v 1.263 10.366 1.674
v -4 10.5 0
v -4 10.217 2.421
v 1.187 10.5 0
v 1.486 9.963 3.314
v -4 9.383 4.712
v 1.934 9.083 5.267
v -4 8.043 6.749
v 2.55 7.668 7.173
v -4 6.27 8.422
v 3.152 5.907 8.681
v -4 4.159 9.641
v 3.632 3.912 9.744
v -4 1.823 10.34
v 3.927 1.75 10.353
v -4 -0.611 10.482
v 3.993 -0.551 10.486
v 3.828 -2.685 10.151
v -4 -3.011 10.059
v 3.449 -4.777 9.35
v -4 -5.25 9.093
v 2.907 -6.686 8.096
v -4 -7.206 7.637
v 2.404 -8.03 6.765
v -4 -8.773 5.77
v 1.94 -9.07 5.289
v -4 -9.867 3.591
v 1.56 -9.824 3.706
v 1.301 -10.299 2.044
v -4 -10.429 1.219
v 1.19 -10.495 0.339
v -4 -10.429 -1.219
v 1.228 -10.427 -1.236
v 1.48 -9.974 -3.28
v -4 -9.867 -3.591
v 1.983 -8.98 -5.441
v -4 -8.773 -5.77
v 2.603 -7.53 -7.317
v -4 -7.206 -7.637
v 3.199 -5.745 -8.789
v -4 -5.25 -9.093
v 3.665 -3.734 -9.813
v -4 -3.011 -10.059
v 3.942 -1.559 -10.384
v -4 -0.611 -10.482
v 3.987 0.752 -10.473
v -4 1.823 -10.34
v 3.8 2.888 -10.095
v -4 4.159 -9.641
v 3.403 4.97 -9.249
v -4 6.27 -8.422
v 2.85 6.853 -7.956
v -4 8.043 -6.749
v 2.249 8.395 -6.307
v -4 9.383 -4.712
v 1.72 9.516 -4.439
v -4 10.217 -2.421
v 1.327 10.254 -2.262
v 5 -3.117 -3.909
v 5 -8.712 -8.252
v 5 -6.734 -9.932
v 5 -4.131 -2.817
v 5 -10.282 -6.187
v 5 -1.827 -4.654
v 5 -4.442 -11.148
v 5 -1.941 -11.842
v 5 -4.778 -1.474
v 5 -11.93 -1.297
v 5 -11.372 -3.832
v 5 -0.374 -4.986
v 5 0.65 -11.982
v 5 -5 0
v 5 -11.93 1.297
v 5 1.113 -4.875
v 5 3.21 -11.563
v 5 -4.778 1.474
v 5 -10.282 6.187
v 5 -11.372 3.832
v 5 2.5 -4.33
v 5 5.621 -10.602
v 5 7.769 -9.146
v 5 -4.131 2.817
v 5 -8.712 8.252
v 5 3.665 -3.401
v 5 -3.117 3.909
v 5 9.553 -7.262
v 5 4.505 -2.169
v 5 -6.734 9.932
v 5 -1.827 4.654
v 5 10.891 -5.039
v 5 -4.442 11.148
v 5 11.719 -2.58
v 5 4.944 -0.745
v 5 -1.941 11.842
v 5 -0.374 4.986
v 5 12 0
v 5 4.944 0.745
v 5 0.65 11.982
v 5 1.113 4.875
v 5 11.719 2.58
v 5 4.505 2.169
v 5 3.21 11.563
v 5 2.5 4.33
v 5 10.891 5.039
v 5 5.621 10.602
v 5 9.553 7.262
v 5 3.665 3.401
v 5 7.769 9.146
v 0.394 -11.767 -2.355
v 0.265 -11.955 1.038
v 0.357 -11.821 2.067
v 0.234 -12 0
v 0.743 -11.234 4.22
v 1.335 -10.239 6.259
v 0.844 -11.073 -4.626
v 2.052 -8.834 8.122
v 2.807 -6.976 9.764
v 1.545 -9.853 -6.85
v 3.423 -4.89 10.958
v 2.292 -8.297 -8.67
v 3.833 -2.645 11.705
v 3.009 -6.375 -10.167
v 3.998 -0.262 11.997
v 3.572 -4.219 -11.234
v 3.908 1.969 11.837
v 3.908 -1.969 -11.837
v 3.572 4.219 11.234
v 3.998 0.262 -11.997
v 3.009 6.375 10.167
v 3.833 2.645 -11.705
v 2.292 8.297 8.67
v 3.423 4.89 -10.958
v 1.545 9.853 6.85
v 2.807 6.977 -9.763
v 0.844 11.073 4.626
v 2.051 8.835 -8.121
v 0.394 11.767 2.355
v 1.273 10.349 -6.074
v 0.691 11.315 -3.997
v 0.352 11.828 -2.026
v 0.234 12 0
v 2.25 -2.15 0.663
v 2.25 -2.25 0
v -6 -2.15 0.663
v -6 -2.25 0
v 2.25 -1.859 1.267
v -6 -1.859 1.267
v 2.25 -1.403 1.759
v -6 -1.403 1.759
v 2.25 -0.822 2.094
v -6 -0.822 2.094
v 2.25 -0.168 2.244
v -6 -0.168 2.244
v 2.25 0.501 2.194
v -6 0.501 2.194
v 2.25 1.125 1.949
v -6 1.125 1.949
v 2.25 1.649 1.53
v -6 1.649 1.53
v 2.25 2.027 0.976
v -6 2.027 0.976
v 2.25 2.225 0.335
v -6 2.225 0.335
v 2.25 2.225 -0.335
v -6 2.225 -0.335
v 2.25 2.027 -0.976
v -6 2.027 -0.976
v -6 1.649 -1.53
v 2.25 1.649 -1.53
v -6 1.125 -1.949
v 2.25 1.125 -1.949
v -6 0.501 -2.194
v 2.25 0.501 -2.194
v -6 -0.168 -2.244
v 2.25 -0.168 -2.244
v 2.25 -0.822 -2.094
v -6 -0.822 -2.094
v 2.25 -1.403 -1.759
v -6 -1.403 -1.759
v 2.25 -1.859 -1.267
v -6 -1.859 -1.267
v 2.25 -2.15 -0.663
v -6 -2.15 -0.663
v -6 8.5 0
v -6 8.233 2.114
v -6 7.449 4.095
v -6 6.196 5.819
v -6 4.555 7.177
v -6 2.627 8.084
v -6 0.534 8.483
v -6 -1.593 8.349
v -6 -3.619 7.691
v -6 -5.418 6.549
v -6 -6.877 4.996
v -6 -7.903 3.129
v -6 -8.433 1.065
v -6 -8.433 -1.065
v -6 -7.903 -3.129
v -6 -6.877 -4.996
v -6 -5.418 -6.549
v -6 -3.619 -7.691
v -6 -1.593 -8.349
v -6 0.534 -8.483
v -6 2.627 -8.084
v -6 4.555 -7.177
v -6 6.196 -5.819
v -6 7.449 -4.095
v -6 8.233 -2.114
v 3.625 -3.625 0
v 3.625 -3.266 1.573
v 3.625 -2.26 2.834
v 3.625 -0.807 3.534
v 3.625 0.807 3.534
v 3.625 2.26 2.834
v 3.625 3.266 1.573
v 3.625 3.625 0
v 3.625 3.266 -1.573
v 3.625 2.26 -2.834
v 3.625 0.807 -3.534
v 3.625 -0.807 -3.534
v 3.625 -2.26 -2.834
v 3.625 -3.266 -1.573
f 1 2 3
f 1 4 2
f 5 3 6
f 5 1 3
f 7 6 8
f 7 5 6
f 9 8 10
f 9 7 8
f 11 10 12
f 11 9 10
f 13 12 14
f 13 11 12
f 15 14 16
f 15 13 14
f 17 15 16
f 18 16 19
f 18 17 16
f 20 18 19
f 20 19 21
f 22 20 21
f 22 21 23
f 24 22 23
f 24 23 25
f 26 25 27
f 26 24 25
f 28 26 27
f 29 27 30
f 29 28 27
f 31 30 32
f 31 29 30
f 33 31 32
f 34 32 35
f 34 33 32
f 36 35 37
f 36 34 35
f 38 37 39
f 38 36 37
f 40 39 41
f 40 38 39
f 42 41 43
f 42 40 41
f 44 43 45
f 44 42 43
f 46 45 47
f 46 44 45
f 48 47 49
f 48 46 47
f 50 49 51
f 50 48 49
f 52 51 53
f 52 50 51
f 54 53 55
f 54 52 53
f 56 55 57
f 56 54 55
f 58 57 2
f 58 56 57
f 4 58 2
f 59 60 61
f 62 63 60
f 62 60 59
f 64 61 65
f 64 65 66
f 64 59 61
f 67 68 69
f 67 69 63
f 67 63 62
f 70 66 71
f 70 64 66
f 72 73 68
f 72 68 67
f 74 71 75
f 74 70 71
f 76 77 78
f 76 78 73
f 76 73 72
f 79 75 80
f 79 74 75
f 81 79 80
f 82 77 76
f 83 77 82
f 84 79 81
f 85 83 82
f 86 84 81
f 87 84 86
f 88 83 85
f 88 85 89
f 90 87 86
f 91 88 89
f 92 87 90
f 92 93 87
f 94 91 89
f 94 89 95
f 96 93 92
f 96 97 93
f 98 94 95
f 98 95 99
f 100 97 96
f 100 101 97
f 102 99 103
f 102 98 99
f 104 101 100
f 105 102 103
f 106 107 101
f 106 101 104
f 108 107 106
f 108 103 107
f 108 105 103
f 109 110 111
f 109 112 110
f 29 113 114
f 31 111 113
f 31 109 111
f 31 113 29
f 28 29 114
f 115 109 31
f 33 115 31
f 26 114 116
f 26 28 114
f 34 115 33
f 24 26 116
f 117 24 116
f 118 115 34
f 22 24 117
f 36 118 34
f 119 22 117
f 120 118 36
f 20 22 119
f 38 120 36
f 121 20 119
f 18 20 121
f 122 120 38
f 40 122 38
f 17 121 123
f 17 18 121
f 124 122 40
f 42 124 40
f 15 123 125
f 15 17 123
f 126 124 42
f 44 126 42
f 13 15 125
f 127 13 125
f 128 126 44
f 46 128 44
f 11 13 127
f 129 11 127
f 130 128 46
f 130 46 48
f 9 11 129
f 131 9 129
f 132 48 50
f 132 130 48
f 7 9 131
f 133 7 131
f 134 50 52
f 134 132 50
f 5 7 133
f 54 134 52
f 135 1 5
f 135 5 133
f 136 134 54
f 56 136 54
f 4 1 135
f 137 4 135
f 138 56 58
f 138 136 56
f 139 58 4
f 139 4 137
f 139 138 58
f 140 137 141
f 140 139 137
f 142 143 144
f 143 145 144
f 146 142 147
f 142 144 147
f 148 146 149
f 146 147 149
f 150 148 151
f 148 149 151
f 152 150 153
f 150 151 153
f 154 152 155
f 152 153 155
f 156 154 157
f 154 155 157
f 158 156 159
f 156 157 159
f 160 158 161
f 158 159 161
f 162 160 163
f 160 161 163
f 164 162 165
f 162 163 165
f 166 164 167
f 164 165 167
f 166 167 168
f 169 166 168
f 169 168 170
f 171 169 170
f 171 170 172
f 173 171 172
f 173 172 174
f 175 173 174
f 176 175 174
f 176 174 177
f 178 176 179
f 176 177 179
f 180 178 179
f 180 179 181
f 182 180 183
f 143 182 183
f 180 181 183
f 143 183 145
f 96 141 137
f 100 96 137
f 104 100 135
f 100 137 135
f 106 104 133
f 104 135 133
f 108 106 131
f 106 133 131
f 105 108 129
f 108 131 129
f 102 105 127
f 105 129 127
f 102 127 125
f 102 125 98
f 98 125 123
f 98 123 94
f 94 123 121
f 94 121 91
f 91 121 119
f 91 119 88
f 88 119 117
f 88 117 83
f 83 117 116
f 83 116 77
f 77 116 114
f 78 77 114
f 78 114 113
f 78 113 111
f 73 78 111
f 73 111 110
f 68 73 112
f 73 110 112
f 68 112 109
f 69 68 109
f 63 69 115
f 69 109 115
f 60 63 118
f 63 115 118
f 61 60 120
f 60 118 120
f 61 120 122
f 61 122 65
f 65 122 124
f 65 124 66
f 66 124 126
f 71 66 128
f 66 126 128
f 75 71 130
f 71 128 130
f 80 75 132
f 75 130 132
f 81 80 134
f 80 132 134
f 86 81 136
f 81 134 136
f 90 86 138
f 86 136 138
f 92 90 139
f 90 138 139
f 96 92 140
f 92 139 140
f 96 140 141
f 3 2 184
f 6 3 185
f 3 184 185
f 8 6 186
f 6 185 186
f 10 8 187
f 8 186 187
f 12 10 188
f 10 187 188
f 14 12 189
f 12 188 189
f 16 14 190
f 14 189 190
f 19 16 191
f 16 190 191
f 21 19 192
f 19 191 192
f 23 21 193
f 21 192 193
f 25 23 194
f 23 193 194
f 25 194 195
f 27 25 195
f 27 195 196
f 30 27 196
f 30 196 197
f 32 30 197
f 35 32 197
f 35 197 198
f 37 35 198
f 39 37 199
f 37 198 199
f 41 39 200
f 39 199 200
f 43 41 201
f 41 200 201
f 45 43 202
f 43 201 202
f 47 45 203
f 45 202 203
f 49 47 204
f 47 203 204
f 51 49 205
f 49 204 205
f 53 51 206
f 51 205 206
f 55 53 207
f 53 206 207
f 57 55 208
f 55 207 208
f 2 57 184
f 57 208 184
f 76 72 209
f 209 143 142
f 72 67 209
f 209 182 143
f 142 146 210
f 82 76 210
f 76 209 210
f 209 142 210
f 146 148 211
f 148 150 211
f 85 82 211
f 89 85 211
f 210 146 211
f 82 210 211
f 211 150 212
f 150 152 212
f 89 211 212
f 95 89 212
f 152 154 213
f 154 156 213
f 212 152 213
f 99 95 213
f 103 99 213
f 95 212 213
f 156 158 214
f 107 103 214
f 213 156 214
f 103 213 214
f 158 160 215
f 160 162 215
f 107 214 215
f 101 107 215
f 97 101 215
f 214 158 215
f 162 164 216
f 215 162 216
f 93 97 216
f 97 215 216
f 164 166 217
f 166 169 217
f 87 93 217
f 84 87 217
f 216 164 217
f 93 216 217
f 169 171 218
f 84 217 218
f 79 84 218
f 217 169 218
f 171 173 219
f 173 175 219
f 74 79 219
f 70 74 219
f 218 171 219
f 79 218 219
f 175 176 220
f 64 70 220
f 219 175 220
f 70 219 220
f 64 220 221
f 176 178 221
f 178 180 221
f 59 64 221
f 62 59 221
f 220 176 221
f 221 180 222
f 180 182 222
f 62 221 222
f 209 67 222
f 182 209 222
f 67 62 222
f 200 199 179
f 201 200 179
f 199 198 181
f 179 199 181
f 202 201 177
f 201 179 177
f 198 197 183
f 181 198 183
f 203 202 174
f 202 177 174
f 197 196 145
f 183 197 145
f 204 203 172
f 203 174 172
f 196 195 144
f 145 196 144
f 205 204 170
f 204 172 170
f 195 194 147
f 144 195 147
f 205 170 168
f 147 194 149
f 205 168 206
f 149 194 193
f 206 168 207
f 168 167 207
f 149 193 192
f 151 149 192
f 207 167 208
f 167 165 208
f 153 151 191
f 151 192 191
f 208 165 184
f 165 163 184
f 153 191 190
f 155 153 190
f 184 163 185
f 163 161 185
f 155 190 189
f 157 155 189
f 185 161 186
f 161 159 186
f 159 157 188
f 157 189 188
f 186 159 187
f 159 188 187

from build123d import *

# Parameters (mm, degrees)
F0_R           = 12
F1_DEPTH       = 5
F2_R           = 21
F3_DEPTH       = 12.001
F3_DEPTH_BACK  = 12.001
F4_R           = 10.5
F5_DEPTH       = 6
F5_DEPTH_BACK  = 4
F6_SIZE        = 2
F8_D           = 4.5
F8_CSINK_D     = 10
F8_CSINK_ANGLE = 90


with BuildPart() as f1:
    # F0 (on Right) → F1 (new body)
    with BuildSketch(Plane.YZ):
        Circle(F0_R)
    extrude(amount=F1_DEPTH)

    # F2 (on Top) → F3 (cut, two sides)
    with BuildSketch(Plane.XY) as f3_sk:
        with Locations((-17, 0)):
            Circle(F2_R)
    extrude(amount=-F3_DEPTH, mode=Mode.SUBTRACT)
    extrude(f3_sk.sketch, amount=F3_DEPTH_BACK, mode=Mode.SUBTRACT)

    # F4 (on Right) → F5 (join, two sides)
    with BuildSketch(Plane.YZ) as f5_sk:
        Circle(F4_R)
    extrude(amount=-F5_DEPTH)
    extrude(f5_sk.sketch, amount=F5_DEPTH_BACK)

    # F6
    f6_edges = [f1.edges().sort_by_distance(p)[0] for p in [
        (-6, -10.5, 0),
    ]]
    chamfer(f6_edges, length=F6_SIZE)

    # F8 (through all)
    with Locations(Plane.YZ.offset(5)):
        with Locations((0, 0)):
            CounterSinkHole(F8_D / 2, F8_CSINK_D / 2, counter_sink_angle=F8_CSINK_ANGLE)


solid = f1.part
